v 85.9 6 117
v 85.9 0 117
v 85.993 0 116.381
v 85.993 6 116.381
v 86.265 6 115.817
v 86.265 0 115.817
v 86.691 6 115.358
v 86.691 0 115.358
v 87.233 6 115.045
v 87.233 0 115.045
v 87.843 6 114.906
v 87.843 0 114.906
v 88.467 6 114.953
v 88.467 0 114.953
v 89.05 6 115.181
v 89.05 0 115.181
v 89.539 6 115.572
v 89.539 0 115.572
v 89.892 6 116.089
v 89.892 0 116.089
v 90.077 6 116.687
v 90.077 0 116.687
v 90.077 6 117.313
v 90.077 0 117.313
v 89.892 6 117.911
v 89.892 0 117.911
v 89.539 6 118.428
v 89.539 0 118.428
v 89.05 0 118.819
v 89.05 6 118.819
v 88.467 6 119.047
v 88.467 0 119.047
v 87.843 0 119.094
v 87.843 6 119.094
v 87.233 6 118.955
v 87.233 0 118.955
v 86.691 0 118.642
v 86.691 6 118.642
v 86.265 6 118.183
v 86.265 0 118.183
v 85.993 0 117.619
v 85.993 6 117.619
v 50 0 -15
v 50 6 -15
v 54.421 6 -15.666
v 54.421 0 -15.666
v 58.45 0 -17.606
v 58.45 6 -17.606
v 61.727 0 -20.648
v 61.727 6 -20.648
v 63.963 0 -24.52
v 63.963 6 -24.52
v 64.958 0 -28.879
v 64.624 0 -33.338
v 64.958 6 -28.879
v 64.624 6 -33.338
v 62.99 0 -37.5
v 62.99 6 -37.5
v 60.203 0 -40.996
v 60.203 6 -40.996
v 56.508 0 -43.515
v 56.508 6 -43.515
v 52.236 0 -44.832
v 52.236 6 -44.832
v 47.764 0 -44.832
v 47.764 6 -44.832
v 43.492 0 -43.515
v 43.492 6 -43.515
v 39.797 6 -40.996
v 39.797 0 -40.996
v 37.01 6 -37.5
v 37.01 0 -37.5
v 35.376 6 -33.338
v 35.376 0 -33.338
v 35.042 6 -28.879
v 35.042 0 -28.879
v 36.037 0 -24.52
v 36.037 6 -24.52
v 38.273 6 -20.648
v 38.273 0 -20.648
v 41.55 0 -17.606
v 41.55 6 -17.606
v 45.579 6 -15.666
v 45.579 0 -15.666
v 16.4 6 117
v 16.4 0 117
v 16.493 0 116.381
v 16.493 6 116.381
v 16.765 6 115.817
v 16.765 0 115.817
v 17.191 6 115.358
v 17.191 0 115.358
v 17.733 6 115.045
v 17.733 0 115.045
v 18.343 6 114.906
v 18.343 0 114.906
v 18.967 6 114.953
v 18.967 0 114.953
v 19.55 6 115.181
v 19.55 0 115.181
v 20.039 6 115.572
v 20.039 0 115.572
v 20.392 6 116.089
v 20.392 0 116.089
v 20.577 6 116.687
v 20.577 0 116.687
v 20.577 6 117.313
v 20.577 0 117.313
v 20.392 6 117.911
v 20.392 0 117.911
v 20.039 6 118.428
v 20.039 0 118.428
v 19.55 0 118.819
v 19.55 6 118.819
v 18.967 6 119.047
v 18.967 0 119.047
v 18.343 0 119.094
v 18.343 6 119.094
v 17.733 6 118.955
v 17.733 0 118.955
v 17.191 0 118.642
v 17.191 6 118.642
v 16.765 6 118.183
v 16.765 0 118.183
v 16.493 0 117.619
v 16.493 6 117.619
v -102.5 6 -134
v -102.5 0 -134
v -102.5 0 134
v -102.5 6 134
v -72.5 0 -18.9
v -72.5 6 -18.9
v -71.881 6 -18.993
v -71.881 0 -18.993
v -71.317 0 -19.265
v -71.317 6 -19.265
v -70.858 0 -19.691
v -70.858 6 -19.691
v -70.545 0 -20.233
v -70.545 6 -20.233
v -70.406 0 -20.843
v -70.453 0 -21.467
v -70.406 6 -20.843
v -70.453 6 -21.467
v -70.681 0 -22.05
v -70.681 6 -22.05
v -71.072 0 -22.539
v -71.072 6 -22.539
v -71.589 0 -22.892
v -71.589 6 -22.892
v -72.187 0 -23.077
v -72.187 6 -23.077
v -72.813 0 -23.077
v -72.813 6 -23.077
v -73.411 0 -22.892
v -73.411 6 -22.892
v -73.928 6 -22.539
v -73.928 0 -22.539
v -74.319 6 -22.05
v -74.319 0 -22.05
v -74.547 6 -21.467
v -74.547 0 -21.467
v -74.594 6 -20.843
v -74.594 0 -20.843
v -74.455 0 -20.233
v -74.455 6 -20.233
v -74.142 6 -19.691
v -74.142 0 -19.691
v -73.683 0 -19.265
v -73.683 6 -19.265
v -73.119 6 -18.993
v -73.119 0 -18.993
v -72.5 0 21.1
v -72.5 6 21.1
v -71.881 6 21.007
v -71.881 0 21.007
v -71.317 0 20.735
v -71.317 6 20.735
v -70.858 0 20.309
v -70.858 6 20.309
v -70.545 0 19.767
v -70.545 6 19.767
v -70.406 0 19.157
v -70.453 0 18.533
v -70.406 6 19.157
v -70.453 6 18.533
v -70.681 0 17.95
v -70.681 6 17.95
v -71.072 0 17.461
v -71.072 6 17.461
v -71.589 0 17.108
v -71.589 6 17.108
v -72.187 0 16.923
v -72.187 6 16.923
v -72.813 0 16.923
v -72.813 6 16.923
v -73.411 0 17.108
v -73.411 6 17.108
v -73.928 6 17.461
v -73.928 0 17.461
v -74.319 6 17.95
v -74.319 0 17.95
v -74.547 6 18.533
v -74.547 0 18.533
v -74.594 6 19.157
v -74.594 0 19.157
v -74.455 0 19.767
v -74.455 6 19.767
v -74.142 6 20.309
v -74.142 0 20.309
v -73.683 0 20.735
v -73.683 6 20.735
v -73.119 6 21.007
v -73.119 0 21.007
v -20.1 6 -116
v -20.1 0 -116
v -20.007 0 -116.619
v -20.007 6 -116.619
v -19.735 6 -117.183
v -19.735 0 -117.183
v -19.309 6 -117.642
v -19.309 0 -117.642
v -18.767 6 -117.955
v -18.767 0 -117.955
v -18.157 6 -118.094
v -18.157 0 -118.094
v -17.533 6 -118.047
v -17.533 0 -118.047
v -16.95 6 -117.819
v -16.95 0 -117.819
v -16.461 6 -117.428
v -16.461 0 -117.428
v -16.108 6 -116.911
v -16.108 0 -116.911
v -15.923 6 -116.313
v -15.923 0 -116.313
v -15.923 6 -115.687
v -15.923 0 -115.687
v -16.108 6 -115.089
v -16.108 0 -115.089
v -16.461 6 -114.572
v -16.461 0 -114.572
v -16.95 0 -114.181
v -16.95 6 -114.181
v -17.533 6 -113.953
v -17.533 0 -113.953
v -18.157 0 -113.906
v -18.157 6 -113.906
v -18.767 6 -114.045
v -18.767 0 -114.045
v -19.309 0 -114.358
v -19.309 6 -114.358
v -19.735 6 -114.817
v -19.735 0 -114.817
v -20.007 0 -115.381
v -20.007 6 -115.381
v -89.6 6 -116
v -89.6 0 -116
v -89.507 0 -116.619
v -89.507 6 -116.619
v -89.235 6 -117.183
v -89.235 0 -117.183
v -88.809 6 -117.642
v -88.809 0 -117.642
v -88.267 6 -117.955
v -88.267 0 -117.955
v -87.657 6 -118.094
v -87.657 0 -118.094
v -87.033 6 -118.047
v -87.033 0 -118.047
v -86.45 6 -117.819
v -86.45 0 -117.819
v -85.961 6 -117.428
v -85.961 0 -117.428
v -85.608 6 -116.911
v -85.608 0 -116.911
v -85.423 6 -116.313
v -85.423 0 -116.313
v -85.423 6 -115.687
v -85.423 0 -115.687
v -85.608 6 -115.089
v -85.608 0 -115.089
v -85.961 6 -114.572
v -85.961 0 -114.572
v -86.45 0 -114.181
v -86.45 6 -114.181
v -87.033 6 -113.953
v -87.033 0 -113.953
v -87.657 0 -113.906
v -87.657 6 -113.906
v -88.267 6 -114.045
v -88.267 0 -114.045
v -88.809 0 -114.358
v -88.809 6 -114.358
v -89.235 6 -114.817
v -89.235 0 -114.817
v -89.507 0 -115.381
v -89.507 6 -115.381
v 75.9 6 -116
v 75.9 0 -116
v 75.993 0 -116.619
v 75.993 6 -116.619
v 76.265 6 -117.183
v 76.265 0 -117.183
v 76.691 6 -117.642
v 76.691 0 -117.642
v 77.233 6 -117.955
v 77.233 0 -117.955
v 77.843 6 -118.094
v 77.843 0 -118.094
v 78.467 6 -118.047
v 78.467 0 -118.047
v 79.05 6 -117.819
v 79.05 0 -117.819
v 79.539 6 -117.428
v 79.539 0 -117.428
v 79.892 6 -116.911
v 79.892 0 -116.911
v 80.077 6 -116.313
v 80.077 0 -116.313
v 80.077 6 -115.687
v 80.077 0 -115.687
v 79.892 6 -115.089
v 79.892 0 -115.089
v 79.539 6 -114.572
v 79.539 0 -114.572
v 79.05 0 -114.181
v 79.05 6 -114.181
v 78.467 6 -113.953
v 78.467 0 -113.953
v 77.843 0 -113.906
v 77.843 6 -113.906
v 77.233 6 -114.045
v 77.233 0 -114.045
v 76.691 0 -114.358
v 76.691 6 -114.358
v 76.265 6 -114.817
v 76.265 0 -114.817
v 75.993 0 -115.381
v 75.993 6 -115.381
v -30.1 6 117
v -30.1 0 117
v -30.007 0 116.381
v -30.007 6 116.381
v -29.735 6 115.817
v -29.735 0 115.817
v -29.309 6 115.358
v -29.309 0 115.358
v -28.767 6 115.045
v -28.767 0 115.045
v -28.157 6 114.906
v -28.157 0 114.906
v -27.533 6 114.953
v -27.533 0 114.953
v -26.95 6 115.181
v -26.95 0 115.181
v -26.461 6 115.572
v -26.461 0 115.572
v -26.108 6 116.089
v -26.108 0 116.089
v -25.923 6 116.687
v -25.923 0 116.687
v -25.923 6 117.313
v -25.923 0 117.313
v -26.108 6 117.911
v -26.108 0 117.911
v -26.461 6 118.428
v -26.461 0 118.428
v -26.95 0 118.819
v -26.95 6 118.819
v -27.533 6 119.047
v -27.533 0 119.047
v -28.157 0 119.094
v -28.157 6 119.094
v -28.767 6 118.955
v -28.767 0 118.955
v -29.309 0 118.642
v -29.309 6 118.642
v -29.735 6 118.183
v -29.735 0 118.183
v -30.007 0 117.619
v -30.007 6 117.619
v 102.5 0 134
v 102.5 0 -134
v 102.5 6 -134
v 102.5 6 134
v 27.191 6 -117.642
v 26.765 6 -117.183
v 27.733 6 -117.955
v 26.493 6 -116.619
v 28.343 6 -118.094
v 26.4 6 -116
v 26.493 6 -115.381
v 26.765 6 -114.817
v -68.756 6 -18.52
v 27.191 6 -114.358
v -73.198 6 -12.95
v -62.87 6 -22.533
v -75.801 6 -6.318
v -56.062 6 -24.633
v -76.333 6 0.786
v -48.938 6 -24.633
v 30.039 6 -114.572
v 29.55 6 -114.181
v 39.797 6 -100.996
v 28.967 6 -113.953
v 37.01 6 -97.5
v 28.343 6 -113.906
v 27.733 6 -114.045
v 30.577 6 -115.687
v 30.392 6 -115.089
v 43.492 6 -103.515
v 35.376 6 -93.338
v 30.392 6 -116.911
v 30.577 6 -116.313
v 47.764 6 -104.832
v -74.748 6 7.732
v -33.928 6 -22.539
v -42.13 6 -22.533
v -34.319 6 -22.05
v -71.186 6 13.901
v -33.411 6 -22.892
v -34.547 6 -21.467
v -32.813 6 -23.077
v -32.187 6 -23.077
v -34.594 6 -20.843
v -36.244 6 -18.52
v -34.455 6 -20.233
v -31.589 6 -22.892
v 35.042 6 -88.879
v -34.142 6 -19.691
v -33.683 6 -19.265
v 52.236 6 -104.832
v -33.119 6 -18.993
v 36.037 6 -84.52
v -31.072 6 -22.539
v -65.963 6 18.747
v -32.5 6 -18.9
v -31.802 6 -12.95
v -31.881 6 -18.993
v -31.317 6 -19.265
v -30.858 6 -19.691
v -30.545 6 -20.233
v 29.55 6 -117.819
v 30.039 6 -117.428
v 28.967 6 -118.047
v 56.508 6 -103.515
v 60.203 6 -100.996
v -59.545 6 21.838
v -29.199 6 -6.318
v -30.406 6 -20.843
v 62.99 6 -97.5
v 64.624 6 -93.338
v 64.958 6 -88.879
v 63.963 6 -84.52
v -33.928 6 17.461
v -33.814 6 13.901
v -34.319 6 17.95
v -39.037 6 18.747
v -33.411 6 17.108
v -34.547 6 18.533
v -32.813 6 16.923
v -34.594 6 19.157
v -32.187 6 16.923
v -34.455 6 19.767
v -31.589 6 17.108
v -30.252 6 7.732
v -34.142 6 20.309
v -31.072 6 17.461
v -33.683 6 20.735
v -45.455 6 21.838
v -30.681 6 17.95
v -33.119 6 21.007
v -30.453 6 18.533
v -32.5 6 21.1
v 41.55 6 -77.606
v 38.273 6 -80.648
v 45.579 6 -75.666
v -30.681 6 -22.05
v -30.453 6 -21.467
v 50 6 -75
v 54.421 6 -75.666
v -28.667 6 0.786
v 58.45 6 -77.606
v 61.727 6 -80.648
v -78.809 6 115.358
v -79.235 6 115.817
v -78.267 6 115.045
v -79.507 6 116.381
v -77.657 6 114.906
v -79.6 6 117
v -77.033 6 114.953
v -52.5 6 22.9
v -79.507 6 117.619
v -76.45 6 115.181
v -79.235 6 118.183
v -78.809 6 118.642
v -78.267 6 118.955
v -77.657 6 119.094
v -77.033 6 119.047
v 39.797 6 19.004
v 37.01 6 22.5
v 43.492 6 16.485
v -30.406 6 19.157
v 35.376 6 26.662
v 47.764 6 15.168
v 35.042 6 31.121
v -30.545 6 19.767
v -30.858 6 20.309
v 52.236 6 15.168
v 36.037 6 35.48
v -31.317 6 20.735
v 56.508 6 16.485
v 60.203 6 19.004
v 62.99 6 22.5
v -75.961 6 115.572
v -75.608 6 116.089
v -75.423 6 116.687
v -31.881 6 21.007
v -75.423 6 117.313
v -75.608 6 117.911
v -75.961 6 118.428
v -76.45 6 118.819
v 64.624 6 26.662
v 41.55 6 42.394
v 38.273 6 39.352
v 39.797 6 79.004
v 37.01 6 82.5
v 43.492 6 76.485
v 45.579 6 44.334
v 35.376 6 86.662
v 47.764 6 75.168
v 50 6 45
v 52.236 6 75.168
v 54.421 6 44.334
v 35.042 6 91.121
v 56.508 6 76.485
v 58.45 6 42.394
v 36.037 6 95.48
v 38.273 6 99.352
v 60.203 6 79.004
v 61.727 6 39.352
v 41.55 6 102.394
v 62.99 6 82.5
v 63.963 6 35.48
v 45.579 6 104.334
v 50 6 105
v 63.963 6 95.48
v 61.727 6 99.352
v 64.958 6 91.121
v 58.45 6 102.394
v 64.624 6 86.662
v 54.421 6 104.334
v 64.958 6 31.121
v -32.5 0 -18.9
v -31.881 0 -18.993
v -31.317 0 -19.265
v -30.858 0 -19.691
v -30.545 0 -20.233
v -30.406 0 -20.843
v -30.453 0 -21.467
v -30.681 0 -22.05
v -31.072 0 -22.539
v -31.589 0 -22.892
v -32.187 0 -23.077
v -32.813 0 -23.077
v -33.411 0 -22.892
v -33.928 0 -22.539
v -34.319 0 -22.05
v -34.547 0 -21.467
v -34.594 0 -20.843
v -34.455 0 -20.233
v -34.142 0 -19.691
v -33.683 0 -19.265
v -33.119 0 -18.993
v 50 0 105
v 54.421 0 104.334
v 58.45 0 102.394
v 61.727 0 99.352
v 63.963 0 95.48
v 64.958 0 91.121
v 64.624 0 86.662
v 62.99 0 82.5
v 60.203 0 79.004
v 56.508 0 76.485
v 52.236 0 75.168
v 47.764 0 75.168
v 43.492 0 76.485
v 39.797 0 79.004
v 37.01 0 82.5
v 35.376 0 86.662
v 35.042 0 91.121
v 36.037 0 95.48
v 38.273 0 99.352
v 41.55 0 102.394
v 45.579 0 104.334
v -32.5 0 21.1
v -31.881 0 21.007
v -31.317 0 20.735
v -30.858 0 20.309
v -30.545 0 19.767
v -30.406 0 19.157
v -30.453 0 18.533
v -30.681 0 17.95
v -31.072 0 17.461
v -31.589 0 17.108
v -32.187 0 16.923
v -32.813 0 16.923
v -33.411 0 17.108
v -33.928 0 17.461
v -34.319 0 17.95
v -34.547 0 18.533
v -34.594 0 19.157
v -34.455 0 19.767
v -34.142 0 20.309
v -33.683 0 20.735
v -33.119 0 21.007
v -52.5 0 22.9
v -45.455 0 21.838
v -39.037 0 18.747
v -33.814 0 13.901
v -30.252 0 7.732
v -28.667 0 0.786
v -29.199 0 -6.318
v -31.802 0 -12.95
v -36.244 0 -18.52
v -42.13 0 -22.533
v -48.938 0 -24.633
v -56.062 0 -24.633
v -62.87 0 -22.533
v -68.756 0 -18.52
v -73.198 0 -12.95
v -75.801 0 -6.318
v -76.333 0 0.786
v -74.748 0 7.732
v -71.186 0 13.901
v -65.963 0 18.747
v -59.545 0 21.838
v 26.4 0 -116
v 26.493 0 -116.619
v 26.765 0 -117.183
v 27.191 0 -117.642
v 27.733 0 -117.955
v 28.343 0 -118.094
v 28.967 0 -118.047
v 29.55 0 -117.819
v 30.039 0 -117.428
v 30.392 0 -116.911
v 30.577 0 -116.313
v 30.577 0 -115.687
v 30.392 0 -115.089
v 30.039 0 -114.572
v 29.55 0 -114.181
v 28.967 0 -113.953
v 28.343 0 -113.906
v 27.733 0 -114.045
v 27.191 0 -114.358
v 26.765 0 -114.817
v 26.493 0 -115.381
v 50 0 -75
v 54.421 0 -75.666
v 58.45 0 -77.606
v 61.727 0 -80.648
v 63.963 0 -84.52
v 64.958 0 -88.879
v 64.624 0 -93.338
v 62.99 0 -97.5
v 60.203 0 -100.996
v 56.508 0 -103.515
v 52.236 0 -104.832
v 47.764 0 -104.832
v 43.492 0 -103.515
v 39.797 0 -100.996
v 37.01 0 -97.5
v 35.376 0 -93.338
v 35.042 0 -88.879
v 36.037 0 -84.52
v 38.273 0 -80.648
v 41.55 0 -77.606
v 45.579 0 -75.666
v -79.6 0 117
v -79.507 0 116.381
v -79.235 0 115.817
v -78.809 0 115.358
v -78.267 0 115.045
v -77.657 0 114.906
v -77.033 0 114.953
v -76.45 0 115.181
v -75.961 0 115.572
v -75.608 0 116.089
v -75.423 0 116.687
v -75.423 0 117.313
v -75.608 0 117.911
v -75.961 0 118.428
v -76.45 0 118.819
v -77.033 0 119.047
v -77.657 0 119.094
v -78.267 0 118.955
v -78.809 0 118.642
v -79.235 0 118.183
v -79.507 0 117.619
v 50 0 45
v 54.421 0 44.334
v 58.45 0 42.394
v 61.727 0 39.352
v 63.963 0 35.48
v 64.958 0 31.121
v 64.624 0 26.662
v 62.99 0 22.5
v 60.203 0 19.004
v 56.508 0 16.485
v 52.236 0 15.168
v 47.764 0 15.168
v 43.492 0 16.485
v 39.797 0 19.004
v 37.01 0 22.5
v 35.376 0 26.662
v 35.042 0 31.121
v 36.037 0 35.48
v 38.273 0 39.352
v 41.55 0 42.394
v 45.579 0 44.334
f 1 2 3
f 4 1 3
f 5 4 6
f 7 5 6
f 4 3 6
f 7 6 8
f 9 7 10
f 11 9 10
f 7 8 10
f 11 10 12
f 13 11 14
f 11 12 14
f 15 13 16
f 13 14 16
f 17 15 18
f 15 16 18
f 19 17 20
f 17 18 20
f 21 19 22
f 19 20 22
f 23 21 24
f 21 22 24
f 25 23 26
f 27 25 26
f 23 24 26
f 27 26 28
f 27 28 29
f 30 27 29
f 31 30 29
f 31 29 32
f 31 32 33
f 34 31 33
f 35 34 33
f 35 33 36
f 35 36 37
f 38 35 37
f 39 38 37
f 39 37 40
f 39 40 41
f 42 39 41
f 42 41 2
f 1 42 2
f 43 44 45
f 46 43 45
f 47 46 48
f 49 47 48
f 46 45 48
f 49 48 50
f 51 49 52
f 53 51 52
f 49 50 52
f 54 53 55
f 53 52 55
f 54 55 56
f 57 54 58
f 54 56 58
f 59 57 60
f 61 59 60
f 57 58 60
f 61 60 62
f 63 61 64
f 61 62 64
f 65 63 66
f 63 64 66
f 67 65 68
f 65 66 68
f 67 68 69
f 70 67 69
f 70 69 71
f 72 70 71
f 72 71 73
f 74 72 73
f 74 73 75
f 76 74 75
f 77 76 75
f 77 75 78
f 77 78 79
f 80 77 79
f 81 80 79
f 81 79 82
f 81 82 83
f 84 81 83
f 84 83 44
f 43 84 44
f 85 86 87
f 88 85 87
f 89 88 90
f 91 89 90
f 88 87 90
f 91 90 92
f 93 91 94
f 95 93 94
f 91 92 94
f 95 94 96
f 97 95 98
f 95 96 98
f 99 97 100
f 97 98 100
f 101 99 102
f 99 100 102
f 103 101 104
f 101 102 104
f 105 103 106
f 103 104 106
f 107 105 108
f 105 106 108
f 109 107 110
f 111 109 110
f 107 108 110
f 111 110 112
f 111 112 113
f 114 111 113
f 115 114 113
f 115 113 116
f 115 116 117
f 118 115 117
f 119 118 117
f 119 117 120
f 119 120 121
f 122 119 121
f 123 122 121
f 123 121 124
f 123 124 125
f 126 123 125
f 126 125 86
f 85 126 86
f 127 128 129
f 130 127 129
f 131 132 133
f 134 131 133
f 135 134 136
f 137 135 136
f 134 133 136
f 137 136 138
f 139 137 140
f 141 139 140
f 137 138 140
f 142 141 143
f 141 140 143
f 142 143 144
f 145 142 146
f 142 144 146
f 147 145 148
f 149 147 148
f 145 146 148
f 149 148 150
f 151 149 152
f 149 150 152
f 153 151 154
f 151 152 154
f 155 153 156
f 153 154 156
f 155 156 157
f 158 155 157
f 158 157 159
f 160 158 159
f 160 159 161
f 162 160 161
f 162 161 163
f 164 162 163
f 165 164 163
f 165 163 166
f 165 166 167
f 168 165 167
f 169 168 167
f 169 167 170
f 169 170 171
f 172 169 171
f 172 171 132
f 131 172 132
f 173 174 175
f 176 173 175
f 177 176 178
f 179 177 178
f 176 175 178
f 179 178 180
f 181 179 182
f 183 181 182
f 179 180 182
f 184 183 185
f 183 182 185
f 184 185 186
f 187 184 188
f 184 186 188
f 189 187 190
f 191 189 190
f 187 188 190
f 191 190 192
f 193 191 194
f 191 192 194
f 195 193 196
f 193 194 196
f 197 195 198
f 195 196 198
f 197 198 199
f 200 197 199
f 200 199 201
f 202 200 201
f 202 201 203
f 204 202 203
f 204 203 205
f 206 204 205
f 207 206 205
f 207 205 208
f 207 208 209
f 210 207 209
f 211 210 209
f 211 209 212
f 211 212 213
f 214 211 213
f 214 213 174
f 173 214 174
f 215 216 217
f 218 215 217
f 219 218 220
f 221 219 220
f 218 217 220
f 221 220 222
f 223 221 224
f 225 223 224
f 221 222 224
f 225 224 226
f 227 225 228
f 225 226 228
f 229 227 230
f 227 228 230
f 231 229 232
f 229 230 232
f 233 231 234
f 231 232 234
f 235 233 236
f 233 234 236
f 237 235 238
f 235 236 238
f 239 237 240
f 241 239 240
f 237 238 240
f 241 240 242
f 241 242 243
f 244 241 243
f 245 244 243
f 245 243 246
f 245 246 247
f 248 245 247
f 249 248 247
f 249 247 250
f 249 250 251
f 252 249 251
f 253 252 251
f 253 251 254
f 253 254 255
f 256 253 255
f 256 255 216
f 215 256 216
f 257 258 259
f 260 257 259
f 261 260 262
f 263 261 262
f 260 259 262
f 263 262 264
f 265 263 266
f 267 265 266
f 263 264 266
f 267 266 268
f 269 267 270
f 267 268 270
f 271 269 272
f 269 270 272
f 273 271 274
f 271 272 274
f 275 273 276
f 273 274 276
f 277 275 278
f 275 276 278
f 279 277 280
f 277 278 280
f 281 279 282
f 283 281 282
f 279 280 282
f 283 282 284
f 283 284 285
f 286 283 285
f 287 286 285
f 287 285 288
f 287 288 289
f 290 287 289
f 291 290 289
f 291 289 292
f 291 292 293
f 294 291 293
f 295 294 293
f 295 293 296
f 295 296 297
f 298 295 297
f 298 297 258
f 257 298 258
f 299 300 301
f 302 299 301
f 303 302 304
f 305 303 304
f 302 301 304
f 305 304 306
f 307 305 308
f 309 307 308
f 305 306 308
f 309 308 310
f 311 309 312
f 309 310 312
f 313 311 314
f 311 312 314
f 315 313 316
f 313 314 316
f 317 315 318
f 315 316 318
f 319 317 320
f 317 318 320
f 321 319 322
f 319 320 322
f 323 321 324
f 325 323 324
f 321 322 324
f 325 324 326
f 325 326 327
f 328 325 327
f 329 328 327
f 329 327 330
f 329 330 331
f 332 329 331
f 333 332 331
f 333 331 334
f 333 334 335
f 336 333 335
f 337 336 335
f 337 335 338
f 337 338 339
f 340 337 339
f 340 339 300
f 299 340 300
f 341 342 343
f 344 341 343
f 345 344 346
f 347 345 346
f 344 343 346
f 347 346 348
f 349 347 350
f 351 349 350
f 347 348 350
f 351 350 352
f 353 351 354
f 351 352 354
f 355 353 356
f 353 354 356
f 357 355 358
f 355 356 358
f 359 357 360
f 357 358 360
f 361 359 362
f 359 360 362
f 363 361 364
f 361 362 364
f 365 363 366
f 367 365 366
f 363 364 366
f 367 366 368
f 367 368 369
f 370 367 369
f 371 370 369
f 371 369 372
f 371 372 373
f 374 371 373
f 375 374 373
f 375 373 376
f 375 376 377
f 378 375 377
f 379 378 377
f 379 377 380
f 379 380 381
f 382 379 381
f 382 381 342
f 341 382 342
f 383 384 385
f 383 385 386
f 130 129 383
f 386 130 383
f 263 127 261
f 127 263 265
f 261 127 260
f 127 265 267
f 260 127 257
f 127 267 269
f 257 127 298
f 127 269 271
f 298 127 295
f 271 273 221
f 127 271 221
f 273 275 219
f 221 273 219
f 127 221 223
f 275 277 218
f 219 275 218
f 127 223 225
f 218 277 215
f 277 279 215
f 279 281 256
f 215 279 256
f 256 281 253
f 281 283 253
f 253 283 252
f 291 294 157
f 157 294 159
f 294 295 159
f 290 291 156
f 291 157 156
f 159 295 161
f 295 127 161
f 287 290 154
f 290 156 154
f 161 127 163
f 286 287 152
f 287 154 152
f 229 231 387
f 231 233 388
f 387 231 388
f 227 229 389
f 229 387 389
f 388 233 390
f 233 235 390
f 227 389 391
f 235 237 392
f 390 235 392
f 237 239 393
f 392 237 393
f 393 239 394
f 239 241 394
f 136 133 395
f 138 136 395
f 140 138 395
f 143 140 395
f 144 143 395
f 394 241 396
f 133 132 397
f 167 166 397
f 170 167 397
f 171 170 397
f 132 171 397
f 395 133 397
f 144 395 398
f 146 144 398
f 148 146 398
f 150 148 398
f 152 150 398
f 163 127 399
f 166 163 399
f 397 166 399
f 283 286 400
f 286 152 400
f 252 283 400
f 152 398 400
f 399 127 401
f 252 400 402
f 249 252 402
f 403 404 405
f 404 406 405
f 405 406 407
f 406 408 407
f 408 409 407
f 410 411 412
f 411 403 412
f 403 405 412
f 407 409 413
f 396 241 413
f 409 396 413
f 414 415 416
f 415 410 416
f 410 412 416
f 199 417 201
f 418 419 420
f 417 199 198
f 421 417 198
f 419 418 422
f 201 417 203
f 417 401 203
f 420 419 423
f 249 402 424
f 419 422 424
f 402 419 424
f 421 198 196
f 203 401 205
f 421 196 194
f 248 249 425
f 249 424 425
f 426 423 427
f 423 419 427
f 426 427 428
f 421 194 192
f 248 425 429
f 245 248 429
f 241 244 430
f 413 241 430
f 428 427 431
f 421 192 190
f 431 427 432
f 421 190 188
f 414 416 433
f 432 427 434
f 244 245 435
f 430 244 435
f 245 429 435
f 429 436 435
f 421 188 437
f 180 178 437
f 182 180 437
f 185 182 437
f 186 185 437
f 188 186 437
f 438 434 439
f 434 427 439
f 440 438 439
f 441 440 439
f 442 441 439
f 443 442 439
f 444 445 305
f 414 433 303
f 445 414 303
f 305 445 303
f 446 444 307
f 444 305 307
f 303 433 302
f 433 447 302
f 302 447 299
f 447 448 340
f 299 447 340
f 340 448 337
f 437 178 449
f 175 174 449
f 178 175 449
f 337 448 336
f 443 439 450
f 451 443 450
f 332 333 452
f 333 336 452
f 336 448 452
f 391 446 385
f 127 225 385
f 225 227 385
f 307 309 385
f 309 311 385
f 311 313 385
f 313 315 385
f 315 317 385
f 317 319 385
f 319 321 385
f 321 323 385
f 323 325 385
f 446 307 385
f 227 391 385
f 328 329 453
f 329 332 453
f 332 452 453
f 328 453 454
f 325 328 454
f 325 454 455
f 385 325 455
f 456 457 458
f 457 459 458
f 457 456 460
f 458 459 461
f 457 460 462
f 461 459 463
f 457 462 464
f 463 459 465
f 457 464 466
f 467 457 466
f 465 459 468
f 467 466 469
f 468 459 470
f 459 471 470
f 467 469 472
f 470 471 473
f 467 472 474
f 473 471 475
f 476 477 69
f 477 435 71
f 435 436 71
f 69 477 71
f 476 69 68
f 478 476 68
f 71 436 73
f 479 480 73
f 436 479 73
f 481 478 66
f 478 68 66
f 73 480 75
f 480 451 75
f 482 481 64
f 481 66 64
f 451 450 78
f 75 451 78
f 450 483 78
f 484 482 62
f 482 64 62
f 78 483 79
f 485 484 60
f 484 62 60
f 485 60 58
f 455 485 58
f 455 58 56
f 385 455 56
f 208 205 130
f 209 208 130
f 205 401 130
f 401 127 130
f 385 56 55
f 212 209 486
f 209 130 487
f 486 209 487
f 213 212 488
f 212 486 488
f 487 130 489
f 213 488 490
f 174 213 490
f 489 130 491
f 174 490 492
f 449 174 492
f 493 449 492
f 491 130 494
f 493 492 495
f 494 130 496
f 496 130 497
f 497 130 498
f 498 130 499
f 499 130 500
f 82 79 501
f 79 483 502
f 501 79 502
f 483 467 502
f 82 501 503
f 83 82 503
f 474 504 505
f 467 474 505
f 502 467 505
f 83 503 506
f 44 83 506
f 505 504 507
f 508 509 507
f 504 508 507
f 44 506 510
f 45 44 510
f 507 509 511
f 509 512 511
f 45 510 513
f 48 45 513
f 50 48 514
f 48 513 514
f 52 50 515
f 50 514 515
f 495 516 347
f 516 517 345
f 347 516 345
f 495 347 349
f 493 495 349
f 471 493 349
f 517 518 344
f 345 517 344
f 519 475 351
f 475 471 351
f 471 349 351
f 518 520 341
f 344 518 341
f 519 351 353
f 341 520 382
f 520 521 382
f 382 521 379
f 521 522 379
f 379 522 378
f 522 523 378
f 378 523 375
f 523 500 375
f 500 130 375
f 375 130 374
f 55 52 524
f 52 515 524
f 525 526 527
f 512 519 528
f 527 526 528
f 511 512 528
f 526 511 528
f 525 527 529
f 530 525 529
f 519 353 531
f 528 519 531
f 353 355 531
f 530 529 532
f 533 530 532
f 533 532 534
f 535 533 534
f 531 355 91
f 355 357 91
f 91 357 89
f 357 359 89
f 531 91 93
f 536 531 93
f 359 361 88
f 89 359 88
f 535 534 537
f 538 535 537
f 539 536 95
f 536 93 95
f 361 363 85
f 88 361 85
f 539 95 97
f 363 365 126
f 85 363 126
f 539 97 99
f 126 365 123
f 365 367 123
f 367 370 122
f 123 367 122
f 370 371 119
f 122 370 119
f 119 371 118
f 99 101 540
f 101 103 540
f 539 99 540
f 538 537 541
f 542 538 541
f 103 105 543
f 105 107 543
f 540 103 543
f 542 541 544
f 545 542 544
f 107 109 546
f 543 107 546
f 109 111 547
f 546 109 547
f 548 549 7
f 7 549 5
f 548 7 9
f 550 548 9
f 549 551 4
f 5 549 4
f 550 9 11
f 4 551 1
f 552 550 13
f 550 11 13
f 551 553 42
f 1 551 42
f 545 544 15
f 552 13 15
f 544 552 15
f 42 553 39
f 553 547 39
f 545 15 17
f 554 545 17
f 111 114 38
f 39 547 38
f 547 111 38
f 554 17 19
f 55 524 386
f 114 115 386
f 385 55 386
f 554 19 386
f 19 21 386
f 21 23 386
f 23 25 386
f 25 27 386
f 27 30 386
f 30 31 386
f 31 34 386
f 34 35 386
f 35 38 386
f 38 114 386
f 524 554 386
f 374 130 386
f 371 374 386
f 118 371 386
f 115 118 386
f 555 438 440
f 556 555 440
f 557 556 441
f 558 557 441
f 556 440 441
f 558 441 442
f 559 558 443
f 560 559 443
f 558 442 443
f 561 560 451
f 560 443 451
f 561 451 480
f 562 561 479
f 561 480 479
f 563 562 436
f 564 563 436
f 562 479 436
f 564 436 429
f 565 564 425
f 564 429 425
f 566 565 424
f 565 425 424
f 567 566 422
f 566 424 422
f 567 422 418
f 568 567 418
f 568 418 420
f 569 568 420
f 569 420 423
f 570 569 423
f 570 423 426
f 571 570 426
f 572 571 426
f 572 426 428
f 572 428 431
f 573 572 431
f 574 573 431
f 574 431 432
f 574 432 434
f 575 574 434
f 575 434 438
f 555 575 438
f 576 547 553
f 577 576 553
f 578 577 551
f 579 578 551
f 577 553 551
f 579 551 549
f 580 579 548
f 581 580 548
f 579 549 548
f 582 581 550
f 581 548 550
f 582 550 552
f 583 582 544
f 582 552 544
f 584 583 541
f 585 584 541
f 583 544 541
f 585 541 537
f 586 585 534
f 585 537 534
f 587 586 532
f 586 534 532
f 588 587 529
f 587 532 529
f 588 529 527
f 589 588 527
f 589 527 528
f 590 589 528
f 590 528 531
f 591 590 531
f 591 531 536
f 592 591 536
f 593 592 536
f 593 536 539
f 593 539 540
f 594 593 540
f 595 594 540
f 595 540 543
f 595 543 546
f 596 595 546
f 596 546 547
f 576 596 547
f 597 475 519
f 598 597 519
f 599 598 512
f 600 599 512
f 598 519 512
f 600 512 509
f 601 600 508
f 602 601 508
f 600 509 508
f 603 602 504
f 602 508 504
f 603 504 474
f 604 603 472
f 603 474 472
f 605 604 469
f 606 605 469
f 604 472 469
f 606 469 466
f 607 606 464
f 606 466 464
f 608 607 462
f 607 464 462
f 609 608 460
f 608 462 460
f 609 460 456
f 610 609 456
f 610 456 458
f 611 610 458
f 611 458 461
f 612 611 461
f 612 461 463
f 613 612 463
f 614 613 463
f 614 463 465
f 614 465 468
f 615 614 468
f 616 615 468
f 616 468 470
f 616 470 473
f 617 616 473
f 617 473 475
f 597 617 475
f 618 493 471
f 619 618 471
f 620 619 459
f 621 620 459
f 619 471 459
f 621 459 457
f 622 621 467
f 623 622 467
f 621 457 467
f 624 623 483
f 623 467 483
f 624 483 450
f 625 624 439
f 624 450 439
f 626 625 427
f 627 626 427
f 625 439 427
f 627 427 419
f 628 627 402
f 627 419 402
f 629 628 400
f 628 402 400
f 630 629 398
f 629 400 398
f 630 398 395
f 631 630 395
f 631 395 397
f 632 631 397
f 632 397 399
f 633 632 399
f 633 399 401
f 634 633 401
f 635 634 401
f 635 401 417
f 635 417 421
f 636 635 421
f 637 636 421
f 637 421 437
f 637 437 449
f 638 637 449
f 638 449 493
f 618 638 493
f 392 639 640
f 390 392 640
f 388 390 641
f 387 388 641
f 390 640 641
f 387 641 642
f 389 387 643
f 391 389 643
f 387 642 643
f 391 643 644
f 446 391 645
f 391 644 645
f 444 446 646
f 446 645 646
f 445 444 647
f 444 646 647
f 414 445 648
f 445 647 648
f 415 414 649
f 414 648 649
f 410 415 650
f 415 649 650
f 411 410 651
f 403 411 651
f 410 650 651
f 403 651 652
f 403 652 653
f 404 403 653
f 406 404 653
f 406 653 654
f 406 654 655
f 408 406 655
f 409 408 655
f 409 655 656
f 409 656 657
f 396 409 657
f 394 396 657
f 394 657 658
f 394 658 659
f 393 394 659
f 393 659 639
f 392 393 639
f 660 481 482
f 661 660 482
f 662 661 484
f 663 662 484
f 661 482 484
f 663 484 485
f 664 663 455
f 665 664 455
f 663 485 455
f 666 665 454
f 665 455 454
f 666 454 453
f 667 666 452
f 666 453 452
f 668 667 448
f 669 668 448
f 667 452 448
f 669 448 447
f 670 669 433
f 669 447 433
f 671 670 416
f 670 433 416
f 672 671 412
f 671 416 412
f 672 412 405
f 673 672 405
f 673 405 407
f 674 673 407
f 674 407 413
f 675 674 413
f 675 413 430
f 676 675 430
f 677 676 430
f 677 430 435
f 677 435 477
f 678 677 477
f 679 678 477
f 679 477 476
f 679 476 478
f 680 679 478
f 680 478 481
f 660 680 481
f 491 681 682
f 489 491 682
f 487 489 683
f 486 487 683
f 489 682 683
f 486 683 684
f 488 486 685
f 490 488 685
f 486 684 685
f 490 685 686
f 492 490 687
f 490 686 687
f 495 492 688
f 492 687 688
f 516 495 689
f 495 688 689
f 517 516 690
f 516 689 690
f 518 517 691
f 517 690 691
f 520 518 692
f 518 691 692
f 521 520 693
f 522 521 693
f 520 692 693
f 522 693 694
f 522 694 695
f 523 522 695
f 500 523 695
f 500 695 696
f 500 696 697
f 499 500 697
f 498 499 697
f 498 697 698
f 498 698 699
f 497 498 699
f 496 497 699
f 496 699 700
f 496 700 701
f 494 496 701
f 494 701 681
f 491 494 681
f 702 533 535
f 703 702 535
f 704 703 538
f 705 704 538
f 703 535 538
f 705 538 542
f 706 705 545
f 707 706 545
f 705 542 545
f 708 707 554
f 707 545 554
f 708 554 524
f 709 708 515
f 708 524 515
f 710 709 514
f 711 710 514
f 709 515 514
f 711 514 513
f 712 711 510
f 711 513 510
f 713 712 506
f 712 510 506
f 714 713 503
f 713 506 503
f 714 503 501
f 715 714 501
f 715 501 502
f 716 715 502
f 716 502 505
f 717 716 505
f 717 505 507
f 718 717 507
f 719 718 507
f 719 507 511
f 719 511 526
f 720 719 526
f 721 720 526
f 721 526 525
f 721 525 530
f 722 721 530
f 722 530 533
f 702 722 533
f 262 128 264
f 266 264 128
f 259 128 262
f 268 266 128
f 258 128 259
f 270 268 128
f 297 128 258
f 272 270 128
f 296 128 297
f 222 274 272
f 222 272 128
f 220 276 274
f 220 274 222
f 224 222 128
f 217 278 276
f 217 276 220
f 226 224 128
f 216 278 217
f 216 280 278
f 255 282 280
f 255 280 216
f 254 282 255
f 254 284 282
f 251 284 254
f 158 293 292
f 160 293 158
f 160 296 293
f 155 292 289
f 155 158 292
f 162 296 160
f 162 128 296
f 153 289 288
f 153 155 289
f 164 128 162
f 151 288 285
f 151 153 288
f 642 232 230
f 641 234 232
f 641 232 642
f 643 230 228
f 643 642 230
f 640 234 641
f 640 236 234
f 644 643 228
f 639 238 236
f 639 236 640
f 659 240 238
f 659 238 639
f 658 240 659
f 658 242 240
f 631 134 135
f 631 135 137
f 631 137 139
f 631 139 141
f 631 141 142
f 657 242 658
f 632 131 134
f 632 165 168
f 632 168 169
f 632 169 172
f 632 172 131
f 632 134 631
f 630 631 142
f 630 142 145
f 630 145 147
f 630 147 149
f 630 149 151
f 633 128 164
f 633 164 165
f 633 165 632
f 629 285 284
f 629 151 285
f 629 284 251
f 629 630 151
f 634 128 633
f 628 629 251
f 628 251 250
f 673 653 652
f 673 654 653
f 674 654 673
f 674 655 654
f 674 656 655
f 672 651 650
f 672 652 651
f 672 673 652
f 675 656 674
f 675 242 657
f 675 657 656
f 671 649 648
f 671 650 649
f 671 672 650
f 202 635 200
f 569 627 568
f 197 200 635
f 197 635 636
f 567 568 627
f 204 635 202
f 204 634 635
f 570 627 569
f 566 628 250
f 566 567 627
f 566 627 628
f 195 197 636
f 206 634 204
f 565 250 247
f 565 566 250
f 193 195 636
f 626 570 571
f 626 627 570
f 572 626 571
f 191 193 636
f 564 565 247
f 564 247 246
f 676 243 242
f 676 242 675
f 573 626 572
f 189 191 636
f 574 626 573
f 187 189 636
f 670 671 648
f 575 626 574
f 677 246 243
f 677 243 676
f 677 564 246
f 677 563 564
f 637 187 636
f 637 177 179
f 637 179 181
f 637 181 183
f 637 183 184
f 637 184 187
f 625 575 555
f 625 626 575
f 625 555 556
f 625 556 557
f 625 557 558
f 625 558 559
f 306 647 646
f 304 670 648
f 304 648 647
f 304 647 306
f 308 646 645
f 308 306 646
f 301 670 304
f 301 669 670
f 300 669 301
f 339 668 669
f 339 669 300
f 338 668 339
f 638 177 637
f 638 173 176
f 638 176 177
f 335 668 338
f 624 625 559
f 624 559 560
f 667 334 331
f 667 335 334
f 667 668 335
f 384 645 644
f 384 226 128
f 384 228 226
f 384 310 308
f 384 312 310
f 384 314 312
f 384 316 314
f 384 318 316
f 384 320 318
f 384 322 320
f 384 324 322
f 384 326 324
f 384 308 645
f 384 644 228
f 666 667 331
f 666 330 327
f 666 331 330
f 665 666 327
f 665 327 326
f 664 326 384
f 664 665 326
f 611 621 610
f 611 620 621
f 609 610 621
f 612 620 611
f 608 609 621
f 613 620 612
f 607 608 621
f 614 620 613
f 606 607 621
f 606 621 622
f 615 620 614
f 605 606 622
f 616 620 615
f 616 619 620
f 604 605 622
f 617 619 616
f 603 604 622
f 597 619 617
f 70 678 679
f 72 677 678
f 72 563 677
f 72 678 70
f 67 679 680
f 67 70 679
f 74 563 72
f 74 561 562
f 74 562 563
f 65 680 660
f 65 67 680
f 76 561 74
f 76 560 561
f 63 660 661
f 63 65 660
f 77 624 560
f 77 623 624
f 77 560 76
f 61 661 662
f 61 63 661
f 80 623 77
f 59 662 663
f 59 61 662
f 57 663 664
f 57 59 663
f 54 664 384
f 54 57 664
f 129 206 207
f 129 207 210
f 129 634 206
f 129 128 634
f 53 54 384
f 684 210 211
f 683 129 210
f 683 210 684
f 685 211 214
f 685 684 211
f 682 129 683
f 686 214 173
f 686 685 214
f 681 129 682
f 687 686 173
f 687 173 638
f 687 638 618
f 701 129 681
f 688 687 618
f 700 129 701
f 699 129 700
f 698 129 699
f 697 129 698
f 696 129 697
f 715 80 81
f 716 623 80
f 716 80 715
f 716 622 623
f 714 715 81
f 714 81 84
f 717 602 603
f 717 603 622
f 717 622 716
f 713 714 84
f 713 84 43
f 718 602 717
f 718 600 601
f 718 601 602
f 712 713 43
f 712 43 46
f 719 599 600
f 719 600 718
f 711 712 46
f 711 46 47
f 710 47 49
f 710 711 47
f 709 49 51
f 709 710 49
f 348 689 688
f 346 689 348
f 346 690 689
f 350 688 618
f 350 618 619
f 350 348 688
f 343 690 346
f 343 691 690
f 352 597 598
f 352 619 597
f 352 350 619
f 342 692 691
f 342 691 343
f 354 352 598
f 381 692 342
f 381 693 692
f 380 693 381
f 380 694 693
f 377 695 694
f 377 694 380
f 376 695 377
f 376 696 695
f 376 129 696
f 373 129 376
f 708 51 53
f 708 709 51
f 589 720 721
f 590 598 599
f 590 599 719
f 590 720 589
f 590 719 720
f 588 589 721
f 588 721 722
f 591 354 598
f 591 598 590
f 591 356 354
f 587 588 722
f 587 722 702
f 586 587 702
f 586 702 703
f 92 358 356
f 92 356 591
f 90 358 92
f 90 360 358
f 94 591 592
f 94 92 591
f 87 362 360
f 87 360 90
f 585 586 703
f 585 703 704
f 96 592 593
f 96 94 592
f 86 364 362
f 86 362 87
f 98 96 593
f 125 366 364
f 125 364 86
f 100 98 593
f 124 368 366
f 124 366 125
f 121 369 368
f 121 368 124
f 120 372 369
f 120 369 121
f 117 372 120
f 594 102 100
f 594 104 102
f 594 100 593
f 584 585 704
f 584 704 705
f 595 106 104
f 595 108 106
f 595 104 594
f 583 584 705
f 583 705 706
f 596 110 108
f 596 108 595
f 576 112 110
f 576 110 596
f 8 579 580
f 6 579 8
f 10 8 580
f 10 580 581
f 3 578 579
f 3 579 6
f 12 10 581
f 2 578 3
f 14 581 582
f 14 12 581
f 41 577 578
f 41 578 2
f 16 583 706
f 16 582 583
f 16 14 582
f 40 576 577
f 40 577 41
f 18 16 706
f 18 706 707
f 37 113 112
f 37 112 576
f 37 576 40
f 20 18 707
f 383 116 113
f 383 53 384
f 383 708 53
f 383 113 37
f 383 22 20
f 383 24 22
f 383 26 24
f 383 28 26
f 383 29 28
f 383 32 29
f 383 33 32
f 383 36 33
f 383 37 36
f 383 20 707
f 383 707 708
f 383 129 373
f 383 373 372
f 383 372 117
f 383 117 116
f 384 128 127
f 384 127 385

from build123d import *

# Parameters (mm, degrees)
ESBO_O1_W                    = 205
ESBO_O1_H                    = 268
RESSALTO_EXTRUS_O1_DEPTH     = 6
ESBO_O3_R                    = 23.9
ESBO_O3_R_2                  = 2.1
CORTE_EXTRUS_O4_DEPTH        = 169.814247029
ESBO_O4_R                    = 15
CORTE_EXTRUS_O5_DEPTH        = 169.814247029
FURO_DE_DI_METRO_4_2_4_2_1_D = 4.2


with BuildPart() as part:
    # Esboço1 → Ressalto-extrusão1 (new body)
    with BuildSketch(Plane.XZ):
        Rectangle(ESBO_O1_W, ESBO_O1_H)
    extrude(amount=-RESSALTO_EXTRUS_O1_DEPTH)

    # Esboço3 → Corte-extrusão4 (cut, through all)
    with BuildSketch(Plane(origin=(0, 6, 0), x_dir=(1, 0, 0), z_dir=(0, 1, 0))):
        with Locations(Location((-52.5, 1, 0), (0, 0, 270))):
            Circle(ESBO_O3_R)
        with Locations(Location((-72.5, 21, 0), (0, 0, 270))):
            Circle(ESBO_O3_R_2)
        with Locations(Location((-32.5, 21, 0), (0, 0, 270))):
            Circle(ESBO_O3_R_2)
        with Locations(Location((-32.5, -19, 0), (0, 0, 270))):
            Circle(ESBO_O3_R_2)
        with Locations(Location((-72.5, -19, 0), (0, 0, 270))):
            Circle(ESBO_O3_R_2)
    extrude(amount=-CORTE_EXTRUS_O4_DEPTH, mode=Mode.SUBTRACT)

    # Esboço4 → Corte-extrusão5 (cut, through all)
    with BuildSketch(Plane(origin=(0, 6, 0), x_dir=(1, 0, 0), z_dir=(0, 1, 0))):
        with Locations(Location((50, 30, 0), (0, 0, 270))):
            Circle(ESBO_O4_R)
        with Locations(Location((50, -30, 0), (0, 0, 270))):
            Circle(ESBO_O4_R)
        with Locations(Location((50, 90, 0), (0, 0, 270))):
            Circle(ESBO_O4_R)
        with Locations(Location((50, -90, 0), (0, 0, 270))):
            Circle(ESBO_O4_R)
    extrude(amount=-CORTE_EXTRUS_O5_DEPTH, mode=Mode.SUBTRACT)

    # Furo de diâmetro Ø4.2 (4.2)1 (through all)
    with Locations(Plane(origin=(0, 6, 0), x_dir=(1, 0, 0), z_dir=(0, 1, 0))):
        with Locations((-87.5, 116), (-18, 116), (28.5, 116), (78, 116), (-77.5, -117), (-28, -117), (18.5, -117), (88, -117)):
            Hole(FURO_DE_DI_METRO_4_2_4_2_1_D / 2)


solid = part.part
